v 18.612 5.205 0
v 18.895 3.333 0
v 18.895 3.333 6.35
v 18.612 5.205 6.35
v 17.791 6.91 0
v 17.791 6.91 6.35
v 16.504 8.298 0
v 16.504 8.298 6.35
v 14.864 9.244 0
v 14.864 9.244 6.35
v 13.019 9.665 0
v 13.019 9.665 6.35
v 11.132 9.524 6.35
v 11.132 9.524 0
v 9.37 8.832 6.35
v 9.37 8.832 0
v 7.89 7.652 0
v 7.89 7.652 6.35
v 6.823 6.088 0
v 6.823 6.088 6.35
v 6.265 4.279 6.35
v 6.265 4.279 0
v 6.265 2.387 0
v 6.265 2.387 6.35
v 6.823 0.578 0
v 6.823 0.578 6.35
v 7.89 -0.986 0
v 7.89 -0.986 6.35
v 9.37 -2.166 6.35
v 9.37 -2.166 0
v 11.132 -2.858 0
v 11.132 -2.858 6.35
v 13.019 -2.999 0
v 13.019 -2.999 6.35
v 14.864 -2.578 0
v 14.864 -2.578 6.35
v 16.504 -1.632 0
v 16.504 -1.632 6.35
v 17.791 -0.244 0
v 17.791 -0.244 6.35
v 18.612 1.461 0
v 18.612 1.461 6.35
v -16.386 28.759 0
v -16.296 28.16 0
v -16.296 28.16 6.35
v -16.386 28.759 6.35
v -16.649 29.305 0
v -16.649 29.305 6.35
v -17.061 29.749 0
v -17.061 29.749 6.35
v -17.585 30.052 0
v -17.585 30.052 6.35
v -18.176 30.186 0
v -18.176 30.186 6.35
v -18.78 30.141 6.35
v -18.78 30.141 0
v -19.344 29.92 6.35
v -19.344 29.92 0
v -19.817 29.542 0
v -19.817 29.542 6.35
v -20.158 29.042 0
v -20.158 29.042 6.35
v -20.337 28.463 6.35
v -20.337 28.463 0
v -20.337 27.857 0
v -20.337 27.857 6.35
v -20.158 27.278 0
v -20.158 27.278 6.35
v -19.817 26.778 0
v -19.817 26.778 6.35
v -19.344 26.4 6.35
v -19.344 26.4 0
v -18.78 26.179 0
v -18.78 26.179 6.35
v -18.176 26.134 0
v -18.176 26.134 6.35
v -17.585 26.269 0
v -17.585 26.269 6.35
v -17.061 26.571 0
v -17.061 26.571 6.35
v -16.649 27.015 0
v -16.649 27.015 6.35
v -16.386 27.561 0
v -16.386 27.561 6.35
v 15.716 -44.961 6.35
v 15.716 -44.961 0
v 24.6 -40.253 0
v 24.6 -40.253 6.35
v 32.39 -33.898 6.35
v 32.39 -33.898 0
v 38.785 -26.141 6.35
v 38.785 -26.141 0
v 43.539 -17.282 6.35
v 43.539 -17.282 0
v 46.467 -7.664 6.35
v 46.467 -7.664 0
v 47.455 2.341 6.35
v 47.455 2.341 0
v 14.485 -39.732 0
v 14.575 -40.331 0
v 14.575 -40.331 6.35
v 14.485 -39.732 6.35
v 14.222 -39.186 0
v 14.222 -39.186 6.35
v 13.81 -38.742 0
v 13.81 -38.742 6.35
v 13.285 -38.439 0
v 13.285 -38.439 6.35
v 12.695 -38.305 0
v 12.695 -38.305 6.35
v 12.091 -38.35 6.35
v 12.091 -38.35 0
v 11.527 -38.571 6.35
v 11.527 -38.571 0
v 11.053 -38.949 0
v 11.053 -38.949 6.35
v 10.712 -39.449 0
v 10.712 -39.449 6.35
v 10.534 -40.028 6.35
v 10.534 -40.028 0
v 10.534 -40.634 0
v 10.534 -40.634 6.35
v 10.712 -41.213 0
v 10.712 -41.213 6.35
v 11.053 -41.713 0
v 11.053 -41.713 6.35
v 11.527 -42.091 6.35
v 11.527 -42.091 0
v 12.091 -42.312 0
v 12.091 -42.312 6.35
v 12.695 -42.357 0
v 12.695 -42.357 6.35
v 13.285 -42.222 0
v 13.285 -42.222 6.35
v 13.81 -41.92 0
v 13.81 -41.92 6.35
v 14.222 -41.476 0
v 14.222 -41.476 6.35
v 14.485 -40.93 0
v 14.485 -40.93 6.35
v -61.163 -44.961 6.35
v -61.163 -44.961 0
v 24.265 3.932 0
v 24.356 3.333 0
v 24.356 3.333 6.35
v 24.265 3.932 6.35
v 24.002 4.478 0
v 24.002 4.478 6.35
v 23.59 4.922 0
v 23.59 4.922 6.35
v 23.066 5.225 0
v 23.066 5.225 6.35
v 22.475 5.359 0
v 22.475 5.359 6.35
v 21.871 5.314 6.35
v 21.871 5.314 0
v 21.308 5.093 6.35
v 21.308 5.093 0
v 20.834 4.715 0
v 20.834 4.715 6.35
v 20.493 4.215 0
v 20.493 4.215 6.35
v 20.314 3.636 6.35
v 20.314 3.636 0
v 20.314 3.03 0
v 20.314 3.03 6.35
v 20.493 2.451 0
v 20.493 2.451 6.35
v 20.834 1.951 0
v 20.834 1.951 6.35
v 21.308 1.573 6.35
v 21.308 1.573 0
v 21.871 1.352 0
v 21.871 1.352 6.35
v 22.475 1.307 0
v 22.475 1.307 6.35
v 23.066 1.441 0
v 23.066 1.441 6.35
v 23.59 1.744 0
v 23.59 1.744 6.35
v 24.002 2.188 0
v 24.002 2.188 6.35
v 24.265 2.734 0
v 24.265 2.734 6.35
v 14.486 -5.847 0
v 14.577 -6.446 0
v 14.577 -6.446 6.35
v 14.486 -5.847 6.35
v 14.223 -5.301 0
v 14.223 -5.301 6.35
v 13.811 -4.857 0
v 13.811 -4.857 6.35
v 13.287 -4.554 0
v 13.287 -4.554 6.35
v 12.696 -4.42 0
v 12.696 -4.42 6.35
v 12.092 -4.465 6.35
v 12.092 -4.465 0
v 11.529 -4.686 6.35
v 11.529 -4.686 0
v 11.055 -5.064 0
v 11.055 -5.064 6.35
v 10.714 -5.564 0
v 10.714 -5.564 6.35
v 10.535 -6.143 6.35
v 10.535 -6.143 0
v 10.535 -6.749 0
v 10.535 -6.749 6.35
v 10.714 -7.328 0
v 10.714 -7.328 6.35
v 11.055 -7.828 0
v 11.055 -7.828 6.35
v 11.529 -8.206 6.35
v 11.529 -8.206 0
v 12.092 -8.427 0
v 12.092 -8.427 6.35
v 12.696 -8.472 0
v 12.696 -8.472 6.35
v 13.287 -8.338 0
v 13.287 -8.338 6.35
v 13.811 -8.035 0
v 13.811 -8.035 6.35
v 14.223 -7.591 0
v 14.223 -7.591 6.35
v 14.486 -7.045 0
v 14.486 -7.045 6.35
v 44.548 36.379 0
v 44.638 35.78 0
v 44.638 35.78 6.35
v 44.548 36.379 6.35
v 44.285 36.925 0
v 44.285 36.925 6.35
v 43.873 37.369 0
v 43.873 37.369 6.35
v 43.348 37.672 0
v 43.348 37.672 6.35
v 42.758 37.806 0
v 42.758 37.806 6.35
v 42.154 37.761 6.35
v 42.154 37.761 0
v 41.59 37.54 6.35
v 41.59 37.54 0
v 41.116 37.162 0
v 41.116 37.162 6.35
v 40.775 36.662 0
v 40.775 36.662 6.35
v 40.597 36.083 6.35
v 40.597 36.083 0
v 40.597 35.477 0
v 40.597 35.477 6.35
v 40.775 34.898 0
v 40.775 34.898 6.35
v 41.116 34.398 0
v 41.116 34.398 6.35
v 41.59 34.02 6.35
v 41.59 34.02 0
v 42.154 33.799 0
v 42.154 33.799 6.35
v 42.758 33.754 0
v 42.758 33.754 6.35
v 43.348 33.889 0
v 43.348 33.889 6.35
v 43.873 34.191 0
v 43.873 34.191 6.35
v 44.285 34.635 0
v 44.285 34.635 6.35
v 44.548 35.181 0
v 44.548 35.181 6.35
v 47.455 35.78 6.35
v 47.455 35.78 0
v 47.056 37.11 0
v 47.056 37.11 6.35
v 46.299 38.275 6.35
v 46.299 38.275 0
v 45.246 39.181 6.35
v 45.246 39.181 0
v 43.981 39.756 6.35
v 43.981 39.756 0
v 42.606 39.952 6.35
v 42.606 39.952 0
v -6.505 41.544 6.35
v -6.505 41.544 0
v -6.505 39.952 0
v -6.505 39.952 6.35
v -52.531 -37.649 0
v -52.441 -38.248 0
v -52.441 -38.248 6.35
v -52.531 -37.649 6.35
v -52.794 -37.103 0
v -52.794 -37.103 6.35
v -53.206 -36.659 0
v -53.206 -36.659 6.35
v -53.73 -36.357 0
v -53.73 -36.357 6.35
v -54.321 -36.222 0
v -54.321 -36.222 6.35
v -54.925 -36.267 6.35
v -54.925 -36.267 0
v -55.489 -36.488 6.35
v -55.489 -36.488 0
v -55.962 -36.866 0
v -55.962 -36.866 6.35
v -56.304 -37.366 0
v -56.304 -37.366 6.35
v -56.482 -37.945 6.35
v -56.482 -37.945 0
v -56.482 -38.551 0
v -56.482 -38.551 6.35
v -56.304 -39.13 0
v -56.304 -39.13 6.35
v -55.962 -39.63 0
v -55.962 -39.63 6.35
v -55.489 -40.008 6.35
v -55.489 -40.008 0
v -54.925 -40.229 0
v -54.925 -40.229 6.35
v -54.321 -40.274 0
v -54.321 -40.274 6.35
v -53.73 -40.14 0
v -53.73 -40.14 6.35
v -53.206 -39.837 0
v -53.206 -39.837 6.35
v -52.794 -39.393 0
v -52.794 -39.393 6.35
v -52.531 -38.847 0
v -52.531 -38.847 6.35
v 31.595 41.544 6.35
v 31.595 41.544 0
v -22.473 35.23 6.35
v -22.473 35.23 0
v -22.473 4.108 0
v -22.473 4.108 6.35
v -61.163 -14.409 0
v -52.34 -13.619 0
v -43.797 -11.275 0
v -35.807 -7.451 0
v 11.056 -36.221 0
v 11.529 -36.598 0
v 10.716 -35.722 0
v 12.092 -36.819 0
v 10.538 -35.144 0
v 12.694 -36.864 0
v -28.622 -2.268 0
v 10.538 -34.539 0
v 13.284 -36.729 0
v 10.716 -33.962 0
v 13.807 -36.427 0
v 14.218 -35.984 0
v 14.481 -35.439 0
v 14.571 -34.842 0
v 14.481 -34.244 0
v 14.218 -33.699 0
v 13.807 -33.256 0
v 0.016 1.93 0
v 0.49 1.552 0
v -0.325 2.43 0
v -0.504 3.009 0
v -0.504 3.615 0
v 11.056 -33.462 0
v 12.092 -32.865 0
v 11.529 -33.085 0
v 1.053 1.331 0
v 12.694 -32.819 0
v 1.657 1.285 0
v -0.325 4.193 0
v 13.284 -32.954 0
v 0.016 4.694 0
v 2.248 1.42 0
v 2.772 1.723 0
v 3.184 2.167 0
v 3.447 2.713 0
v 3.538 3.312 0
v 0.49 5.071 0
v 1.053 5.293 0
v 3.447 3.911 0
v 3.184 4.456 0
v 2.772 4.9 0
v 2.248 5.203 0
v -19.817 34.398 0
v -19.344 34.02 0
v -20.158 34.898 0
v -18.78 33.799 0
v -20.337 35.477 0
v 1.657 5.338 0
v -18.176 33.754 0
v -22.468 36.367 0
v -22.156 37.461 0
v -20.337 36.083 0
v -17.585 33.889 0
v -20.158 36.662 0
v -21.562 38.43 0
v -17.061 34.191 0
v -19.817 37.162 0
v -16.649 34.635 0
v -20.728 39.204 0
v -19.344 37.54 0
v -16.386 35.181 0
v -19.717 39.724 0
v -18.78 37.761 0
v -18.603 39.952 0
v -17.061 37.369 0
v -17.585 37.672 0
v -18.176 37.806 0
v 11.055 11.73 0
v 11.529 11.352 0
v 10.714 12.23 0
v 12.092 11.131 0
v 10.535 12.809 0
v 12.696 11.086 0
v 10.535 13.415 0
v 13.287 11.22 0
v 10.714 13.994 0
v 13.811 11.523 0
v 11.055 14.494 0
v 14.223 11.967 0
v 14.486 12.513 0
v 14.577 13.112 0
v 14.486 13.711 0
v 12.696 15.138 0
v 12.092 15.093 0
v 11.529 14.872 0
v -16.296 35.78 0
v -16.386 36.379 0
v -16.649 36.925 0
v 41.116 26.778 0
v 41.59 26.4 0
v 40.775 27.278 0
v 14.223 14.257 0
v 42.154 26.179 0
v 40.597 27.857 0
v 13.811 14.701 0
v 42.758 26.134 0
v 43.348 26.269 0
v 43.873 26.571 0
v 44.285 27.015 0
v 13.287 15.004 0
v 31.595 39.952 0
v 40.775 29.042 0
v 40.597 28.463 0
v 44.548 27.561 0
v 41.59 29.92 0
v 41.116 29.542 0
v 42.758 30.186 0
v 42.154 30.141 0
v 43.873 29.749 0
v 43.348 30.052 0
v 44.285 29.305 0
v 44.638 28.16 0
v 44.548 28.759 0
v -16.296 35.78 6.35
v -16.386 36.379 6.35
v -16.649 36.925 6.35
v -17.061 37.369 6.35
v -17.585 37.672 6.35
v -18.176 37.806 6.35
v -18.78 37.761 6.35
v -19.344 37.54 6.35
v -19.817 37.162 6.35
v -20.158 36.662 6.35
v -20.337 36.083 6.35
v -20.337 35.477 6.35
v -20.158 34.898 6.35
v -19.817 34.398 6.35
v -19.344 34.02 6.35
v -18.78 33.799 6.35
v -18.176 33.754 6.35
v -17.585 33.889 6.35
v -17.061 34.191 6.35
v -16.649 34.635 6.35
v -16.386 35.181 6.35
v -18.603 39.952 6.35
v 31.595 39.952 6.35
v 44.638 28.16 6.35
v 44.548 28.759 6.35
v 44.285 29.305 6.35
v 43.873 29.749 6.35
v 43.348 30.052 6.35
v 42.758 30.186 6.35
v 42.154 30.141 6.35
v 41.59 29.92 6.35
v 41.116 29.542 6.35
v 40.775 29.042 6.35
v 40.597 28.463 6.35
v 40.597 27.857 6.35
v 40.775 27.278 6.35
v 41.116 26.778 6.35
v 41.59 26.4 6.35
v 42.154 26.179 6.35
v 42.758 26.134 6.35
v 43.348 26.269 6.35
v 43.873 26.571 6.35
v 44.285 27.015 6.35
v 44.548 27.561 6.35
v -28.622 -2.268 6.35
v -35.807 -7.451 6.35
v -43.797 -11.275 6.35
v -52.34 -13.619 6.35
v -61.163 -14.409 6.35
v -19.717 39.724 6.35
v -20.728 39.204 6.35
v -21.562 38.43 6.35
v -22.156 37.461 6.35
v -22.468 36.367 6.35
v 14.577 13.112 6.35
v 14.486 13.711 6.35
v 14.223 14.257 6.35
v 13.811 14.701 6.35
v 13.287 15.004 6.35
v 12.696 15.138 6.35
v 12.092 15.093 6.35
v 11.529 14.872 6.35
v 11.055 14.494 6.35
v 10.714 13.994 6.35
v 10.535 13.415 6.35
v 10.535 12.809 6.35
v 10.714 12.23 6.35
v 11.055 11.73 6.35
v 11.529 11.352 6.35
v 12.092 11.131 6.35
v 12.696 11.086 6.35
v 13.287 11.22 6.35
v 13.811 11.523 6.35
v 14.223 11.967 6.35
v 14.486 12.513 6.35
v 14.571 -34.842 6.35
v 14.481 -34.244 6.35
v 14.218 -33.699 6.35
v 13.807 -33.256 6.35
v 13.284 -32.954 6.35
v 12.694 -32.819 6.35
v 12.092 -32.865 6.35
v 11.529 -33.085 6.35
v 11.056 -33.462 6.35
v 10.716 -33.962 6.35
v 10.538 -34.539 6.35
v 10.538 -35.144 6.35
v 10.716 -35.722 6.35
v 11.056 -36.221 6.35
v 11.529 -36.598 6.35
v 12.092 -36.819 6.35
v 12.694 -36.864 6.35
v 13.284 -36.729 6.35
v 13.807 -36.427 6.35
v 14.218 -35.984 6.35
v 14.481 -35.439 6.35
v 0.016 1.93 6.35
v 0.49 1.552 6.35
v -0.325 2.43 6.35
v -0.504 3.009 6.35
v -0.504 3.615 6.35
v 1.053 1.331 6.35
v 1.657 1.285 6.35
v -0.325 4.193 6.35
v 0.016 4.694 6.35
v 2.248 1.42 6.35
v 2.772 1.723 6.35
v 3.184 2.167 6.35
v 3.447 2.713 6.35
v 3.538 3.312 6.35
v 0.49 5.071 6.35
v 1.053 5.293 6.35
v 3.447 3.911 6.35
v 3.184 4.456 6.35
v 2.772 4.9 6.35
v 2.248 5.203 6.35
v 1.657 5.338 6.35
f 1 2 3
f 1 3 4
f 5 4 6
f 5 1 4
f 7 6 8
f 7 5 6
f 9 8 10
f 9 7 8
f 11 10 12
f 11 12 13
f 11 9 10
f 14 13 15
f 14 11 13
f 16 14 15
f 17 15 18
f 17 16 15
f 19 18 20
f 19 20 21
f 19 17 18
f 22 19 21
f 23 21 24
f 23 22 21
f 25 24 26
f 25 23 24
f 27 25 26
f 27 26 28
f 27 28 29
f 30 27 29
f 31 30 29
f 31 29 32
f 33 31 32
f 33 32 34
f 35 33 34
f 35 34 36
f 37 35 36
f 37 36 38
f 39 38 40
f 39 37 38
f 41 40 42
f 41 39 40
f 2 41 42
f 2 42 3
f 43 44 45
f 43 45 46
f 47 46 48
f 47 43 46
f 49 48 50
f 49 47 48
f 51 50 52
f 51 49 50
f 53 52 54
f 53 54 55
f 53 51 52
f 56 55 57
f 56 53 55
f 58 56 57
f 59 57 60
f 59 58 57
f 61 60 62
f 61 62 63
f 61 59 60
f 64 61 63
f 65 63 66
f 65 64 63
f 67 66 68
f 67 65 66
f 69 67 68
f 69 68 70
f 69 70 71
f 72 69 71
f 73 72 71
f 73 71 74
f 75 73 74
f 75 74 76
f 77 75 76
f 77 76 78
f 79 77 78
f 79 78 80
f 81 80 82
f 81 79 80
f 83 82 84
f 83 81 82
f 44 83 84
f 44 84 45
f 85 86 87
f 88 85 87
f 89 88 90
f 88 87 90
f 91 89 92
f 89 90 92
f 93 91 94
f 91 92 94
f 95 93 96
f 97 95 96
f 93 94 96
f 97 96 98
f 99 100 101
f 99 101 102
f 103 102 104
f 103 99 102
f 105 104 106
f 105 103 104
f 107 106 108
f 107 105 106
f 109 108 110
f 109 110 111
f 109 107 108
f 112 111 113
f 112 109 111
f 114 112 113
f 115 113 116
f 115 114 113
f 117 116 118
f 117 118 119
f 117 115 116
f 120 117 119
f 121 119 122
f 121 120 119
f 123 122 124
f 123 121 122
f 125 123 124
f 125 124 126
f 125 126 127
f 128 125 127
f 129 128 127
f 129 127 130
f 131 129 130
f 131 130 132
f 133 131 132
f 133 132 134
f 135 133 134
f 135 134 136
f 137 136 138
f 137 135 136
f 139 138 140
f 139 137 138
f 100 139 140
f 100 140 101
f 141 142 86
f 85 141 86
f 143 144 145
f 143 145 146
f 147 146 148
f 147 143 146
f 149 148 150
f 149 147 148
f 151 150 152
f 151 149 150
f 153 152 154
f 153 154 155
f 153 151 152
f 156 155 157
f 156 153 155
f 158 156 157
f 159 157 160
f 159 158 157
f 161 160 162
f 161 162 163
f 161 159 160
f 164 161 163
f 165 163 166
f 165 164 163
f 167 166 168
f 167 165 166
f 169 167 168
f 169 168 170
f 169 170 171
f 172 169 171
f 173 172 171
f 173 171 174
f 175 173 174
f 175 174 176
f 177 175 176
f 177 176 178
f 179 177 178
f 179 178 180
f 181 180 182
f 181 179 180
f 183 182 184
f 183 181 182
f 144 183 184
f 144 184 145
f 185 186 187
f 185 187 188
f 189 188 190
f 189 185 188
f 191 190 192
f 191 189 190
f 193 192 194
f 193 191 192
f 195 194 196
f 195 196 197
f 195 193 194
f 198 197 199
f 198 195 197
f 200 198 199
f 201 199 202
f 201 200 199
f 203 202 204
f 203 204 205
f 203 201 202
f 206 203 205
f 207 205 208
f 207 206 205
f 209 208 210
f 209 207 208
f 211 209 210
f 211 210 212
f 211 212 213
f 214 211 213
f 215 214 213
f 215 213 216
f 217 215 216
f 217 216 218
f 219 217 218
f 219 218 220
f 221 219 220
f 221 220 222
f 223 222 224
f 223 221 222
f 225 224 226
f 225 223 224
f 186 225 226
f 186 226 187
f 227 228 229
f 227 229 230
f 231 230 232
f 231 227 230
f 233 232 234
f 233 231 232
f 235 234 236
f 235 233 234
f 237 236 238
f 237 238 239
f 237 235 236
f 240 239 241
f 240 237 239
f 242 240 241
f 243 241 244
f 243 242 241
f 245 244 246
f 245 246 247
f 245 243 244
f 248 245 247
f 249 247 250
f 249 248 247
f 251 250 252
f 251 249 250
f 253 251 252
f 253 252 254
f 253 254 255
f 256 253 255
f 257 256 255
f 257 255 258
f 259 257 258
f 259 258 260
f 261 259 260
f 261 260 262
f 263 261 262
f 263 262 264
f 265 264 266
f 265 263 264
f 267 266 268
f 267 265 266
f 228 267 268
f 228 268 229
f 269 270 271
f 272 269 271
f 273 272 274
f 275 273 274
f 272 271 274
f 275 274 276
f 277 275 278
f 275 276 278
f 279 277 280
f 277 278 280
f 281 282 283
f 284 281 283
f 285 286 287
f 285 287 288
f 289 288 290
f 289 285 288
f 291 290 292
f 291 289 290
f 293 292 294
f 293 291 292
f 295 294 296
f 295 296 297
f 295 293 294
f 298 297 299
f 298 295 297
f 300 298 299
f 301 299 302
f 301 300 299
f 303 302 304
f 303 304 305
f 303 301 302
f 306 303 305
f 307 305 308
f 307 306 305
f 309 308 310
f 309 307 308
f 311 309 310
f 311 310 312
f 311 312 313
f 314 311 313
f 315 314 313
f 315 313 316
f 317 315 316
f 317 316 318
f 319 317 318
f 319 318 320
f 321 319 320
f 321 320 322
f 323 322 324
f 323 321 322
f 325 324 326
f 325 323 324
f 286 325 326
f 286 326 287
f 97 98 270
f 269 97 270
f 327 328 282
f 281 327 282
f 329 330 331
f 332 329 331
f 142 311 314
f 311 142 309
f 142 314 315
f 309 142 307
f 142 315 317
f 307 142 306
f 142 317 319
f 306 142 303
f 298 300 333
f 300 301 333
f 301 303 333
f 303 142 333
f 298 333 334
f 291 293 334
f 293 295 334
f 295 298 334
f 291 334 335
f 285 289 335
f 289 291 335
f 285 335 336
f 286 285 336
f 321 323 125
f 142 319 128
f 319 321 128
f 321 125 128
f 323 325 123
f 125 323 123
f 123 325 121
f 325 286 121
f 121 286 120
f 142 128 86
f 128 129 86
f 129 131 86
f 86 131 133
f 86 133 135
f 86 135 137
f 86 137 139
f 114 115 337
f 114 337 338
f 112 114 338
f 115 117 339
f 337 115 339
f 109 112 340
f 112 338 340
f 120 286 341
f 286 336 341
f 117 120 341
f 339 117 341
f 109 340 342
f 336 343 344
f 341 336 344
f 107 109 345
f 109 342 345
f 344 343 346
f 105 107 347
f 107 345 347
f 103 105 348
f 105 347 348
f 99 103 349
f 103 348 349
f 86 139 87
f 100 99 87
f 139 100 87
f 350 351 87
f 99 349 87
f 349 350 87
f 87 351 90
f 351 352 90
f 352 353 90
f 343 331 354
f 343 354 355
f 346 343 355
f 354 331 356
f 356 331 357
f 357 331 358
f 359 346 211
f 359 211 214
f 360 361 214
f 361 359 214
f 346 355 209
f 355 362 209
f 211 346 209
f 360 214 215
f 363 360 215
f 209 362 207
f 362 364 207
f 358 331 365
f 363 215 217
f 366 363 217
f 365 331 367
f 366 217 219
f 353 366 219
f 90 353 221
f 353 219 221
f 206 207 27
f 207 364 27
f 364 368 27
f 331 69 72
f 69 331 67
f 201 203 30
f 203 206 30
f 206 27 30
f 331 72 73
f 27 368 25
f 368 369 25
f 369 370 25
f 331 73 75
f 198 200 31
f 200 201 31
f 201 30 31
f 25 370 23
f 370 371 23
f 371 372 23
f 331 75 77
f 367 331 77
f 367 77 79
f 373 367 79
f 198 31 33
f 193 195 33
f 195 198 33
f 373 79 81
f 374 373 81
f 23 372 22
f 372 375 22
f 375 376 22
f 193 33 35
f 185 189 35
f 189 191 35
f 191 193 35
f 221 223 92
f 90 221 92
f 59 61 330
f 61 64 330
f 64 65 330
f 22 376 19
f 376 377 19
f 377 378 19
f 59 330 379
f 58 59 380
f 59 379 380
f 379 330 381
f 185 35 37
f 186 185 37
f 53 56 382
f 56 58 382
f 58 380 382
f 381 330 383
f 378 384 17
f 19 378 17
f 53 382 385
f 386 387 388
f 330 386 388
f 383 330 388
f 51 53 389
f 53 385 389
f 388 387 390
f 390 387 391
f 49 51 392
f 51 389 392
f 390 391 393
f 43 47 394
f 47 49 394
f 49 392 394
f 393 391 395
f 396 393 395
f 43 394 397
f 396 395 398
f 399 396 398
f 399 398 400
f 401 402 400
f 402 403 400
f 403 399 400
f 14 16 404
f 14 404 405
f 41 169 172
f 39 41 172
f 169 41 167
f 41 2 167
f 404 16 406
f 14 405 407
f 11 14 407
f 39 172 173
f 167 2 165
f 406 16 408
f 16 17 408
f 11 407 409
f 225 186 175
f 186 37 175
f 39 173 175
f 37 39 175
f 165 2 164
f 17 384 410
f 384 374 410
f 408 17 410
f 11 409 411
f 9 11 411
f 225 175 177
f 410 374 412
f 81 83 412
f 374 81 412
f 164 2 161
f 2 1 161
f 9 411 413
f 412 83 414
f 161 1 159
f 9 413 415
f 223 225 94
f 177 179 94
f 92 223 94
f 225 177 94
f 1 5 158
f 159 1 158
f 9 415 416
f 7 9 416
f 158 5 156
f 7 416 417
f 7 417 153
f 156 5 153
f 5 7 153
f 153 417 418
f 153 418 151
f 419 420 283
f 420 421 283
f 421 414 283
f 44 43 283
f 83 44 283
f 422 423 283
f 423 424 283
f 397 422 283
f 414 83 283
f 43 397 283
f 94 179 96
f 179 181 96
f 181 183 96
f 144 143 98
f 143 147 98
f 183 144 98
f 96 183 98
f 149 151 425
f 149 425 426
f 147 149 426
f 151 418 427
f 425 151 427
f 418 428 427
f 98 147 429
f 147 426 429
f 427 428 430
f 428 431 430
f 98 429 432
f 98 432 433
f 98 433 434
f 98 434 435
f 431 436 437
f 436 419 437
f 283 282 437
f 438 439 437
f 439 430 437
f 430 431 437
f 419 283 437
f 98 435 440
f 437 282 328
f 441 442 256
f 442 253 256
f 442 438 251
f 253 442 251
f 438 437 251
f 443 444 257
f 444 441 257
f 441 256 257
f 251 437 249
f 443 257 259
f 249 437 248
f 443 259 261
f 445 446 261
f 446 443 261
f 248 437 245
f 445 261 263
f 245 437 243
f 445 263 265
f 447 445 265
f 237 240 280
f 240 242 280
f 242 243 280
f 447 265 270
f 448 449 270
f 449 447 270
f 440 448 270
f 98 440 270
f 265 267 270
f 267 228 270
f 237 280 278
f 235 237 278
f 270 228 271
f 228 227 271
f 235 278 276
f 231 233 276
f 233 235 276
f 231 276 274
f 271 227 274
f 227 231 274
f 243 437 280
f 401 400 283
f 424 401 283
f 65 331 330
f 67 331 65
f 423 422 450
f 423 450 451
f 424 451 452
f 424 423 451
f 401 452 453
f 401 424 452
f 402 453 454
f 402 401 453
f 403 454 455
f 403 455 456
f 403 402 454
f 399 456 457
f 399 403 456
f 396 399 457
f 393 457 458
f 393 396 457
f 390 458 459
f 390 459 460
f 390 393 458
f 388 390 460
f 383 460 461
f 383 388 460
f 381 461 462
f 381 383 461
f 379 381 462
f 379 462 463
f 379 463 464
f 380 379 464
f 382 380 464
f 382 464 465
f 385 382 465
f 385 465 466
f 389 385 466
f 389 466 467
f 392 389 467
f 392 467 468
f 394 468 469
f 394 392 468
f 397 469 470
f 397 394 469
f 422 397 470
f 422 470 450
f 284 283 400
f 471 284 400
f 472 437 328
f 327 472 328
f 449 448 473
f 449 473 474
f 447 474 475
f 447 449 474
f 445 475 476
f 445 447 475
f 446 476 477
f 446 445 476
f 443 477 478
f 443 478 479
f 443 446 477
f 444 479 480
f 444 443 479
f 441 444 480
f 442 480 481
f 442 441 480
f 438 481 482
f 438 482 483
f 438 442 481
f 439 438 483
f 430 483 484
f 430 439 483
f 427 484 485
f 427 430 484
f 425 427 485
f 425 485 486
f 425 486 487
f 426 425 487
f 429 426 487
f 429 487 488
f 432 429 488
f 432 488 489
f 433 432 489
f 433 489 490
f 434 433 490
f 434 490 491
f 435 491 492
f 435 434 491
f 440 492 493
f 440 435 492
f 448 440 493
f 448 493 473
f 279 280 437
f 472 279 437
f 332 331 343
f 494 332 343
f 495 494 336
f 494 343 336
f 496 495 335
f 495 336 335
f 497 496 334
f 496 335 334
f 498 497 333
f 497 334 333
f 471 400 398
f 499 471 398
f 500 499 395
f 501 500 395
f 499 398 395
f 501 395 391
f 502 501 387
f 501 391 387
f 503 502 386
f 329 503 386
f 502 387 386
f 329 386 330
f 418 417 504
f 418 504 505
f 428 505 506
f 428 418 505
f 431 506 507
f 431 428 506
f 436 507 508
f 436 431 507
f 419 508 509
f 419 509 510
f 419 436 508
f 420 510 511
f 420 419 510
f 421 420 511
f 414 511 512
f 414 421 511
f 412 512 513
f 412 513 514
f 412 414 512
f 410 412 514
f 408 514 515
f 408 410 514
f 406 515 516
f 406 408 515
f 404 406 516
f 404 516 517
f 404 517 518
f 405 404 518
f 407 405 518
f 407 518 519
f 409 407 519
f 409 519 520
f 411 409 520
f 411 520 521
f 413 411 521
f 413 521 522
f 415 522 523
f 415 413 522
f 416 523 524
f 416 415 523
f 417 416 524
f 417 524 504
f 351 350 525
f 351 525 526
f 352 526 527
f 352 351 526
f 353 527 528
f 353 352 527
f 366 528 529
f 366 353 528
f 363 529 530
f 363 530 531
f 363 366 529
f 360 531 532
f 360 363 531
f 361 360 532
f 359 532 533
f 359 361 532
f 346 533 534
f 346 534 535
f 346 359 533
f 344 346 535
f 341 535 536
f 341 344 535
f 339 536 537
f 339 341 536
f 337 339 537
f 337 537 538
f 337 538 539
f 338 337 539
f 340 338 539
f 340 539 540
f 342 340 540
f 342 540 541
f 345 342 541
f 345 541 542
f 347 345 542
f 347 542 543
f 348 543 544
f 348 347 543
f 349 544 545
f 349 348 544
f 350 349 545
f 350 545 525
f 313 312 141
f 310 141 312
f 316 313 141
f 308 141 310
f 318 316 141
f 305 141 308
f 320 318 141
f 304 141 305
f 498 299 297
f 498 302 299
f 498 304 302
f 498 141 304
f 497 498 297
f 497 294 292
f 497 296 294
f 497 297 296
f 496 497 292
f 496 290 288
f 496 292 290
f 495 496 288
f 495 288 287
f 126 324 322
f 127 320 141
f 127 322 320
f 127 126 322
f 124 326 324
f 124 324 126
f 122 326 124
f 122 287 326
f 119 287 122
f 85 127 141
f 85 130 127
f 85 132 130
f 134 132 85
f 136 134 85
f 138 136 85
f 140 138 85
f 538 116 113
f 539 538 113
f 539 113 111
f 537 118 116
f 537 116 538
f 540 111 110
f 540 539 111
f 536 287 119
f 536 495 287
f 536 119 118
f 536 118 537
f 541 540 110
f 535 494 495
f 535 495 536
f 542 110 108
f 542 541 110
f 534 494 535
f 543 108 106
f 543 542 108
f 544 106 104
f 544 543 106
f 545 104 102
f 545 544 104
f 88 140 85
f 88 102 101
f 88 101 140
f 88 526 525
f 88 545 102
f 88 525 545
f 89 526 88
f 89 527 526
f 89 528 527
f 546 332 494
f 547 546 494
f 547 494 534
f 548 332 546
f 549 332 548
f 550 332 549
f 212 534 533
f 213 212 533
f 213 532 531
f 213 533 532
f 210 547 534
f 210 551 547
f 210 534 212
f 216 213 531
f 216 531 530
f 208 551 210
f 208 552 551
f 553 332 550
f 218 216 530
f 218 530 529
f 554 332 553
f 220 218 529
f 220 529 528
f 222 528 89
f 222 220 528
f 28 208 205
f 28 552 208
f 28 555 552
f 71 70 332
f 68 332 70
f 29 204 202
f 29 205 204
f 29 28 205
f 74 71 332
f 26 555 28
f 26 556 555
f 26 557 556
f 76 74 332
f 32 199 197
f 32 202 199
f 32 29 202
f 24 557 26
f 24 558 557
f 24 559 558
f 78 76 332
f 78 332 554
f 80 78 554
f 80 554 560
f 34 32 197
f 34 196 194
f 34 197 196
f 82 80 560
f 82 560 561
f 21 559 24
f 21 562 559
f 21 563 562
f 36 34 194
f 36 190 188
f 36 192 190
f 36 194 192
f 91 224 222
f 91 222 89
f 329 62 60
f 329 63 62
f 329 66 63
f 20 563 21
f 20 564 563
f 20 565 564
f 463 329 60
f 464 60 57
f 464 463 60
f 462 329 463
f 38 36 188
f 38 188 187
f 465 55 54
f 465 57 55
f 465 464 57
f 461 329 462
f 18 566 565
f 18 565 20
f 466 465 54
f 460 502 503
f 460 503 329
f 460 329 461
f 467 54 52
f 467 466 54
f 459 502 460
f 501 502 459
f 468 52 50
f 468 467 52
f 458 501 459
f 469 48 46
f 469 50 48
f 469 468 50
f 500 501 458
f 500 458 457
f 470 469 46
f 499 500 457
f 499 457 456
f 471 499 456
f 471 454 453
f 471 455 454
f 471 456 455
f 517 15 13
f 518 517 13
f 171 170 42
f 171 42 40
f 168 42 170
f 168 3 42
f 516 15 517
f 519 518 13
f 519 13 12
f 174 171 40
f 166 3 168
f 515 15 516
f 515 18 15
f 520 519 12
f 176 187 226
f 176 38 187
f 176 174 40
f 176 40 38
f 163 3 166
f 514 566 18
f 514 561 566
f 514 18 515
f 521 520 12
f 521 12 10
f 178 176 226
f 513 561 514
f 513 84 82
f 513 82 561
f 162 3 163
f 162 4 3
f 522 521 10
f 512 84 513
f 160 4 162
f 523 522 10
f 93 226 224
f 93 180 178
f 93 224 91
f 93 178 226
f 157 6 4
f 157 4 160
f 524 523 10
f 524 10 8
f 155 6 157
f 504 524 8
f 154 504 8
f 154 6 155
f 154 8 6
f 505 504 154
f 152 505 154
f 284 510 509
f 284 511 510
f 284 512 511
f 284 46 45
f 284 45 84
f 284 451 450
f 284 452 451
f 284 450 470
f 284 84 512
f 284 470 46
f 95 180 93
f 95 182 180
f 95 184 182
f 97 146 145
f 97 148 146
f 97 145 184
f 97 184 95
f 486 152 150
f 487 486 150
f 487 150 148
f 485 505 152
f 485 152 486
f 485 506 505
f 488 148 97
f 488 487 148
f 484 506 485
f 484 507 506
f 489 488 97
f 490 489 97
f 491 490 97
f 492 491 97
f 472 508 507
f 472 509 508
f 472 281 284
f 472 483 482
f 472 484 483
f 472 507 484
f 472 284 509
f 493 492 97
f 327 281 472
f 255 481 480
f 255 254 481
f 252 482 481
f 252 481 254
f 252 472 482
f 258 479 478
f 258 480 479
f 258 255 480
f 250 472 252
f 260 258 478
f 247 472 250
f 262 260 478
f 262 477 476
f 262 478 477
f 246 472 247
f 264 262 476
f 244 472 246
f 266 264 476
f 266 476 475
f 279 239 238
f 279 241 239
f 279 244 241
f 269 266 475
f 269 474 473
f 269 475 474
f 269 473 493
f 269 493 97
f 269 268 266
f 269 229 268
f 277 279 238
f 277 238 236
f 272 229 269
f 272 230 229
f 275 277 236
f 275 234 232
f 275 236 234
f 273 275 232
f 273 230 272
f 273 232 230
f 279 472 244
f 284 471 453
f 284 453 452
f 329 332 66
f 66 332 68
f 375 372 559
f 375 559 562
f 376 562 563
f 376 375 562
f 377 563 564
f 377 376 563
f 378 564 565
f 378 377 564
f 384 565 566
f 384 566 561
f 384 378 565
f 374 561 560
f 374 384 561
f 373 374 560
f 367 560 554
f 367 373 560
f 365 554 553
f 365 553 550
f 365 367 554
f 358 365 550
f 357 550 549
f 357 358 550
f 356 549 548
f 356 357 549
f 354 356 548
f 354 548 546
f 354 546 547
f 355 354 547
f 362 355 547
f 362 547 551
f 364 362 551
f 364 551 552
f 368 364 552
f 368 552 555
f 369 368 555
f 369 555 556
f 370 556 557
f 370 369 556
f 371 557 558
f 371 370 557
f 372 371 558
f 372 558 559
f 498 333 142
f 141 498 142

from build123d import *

# Parameters (mm, degrees)
F0_R     = 2.032
F0_R_2   = 2.0279464285
F0_R_3   = 6.35
F1_DEPTH = 6.35


# Not quite as in the source:
# - a feature names something its author has since deleted; it is built from what else it names


with BuildPart() as f1:
    # F0 (on Top) → F1 (new body)
    with BuildSketch(Plane.XY):
        with BuildLine():
            Line((-61.1627068575, -36.5071908827), (-61.1627068575, -43.0169059006))
            Line((-61.1627068575, -43.0169059006), (-61.1627068575, -44.9605127839))
            Line((-61.1627068575, -44.9605127839), (15.7162476502, -44.9605127839))
            ThreePointArc((15.7162476502, -44.9605127839), (38.7853662126, -26.1405440216), (47.4554415236, 2.3411211257))
            Line((47.4554415236, 2.3411211257), (47.4554415236, 4.3248883003))
            Line((47.4554415236, 4.3248883003), (47.4554415236, 35.7800583649))
            ThreePointArc((47.4554415236, 35.7800583649), (45.8046467005, 38.7657690374), (42.6059814887, 39.9524166811))
            Line((42.6059814887, 39.9524166811), (31.5945293048, 39.9524166811))
            Line((31.5945293048, 39.9524166811), (31.5945293048, 41.5436038705))
            Line((31.5945293048, 41.5436038705), (-6.5054706952, 41.5436038705))
            Line((-6.5054706952, 41.5436038705), (-6.5054706952, 39.9524166811))
            Line((-6.5054706952, 39.9524166811), (-18.0521932819, 39.9524166811))
            Line((-18.0521932819, 39.9524166811), (-18.6032061507, 39.9524166811))
            ThreePointArc((-18.6032061507, 39.9524166811), (-21.5619320606, 38.4303826577), (-22.4728391096, 35.2302428284))
            Line((-22.4728391096, 35.2302428284), (-22.4728391096, 4.1078329732))
            ThreePointArc((-22.4728391096, 4.1078329732), (-39.7163433031, -9.5414513084), (-61.1627068575, -14.4091908827))
            Line((-61.1627068575, -14.4091908827), (-61.1627068575, -36.5071908827))
        make_face()
        with Locations((-54.4728634162, -38.2481282619)):
            Circle(F0_R, mode=Mode.SUBTRACT)
        with Locations((12.5428884775, -40.3309306172)):
            Circle(F0_R, mode=Mode.SUBTRACT)
        with Locations((12.5428884775, -34.8417377142)):
            Circle(F0_R_2, mode=Mode.SUBTRACT)
        with Locations((12.5445293048, -6.445995287)):
            Circle(F0_R, mode=Mode.SUBTRACT)
        with Locations((-18.3276997163, 28.1600583649)):
            Circle(F0_R, mode=Mode.SUBTRACT)
        with Locations((-18.3276997163, 35.7800583649)):
            Circle(F0_R, mode=Mode.SUBTRACT)
        with Locations((1.5055636177, 3.3117256275)):
            Circle(F0_R, mode=Mode.SUBTRACT)
        with Locations((12.5445293048, 3.333004713)):
            Circle(F0_R_3, mode=Mode.SUBTRACT)
        with Locations((12.5445293048, 13.112004713)):
            Circle(F0_R, mode=Mode.SUBTRACT)
        with Locations((22.3235293048, 3.333004713)):
            Circle(F0_R, mode=Mode.SUBTRACT)
        with Locations((42.6059814887, 28.1600583649)):
            Circle(F0_R, mode=Mode.SUBTRACT)
        with Locations((42.6059814887, 35.7800583649)):
            Circle(F0_R, mode=Mode.SUBTRACT)
    extrude(amount=F1_DEPTH)


solid = f1.part
